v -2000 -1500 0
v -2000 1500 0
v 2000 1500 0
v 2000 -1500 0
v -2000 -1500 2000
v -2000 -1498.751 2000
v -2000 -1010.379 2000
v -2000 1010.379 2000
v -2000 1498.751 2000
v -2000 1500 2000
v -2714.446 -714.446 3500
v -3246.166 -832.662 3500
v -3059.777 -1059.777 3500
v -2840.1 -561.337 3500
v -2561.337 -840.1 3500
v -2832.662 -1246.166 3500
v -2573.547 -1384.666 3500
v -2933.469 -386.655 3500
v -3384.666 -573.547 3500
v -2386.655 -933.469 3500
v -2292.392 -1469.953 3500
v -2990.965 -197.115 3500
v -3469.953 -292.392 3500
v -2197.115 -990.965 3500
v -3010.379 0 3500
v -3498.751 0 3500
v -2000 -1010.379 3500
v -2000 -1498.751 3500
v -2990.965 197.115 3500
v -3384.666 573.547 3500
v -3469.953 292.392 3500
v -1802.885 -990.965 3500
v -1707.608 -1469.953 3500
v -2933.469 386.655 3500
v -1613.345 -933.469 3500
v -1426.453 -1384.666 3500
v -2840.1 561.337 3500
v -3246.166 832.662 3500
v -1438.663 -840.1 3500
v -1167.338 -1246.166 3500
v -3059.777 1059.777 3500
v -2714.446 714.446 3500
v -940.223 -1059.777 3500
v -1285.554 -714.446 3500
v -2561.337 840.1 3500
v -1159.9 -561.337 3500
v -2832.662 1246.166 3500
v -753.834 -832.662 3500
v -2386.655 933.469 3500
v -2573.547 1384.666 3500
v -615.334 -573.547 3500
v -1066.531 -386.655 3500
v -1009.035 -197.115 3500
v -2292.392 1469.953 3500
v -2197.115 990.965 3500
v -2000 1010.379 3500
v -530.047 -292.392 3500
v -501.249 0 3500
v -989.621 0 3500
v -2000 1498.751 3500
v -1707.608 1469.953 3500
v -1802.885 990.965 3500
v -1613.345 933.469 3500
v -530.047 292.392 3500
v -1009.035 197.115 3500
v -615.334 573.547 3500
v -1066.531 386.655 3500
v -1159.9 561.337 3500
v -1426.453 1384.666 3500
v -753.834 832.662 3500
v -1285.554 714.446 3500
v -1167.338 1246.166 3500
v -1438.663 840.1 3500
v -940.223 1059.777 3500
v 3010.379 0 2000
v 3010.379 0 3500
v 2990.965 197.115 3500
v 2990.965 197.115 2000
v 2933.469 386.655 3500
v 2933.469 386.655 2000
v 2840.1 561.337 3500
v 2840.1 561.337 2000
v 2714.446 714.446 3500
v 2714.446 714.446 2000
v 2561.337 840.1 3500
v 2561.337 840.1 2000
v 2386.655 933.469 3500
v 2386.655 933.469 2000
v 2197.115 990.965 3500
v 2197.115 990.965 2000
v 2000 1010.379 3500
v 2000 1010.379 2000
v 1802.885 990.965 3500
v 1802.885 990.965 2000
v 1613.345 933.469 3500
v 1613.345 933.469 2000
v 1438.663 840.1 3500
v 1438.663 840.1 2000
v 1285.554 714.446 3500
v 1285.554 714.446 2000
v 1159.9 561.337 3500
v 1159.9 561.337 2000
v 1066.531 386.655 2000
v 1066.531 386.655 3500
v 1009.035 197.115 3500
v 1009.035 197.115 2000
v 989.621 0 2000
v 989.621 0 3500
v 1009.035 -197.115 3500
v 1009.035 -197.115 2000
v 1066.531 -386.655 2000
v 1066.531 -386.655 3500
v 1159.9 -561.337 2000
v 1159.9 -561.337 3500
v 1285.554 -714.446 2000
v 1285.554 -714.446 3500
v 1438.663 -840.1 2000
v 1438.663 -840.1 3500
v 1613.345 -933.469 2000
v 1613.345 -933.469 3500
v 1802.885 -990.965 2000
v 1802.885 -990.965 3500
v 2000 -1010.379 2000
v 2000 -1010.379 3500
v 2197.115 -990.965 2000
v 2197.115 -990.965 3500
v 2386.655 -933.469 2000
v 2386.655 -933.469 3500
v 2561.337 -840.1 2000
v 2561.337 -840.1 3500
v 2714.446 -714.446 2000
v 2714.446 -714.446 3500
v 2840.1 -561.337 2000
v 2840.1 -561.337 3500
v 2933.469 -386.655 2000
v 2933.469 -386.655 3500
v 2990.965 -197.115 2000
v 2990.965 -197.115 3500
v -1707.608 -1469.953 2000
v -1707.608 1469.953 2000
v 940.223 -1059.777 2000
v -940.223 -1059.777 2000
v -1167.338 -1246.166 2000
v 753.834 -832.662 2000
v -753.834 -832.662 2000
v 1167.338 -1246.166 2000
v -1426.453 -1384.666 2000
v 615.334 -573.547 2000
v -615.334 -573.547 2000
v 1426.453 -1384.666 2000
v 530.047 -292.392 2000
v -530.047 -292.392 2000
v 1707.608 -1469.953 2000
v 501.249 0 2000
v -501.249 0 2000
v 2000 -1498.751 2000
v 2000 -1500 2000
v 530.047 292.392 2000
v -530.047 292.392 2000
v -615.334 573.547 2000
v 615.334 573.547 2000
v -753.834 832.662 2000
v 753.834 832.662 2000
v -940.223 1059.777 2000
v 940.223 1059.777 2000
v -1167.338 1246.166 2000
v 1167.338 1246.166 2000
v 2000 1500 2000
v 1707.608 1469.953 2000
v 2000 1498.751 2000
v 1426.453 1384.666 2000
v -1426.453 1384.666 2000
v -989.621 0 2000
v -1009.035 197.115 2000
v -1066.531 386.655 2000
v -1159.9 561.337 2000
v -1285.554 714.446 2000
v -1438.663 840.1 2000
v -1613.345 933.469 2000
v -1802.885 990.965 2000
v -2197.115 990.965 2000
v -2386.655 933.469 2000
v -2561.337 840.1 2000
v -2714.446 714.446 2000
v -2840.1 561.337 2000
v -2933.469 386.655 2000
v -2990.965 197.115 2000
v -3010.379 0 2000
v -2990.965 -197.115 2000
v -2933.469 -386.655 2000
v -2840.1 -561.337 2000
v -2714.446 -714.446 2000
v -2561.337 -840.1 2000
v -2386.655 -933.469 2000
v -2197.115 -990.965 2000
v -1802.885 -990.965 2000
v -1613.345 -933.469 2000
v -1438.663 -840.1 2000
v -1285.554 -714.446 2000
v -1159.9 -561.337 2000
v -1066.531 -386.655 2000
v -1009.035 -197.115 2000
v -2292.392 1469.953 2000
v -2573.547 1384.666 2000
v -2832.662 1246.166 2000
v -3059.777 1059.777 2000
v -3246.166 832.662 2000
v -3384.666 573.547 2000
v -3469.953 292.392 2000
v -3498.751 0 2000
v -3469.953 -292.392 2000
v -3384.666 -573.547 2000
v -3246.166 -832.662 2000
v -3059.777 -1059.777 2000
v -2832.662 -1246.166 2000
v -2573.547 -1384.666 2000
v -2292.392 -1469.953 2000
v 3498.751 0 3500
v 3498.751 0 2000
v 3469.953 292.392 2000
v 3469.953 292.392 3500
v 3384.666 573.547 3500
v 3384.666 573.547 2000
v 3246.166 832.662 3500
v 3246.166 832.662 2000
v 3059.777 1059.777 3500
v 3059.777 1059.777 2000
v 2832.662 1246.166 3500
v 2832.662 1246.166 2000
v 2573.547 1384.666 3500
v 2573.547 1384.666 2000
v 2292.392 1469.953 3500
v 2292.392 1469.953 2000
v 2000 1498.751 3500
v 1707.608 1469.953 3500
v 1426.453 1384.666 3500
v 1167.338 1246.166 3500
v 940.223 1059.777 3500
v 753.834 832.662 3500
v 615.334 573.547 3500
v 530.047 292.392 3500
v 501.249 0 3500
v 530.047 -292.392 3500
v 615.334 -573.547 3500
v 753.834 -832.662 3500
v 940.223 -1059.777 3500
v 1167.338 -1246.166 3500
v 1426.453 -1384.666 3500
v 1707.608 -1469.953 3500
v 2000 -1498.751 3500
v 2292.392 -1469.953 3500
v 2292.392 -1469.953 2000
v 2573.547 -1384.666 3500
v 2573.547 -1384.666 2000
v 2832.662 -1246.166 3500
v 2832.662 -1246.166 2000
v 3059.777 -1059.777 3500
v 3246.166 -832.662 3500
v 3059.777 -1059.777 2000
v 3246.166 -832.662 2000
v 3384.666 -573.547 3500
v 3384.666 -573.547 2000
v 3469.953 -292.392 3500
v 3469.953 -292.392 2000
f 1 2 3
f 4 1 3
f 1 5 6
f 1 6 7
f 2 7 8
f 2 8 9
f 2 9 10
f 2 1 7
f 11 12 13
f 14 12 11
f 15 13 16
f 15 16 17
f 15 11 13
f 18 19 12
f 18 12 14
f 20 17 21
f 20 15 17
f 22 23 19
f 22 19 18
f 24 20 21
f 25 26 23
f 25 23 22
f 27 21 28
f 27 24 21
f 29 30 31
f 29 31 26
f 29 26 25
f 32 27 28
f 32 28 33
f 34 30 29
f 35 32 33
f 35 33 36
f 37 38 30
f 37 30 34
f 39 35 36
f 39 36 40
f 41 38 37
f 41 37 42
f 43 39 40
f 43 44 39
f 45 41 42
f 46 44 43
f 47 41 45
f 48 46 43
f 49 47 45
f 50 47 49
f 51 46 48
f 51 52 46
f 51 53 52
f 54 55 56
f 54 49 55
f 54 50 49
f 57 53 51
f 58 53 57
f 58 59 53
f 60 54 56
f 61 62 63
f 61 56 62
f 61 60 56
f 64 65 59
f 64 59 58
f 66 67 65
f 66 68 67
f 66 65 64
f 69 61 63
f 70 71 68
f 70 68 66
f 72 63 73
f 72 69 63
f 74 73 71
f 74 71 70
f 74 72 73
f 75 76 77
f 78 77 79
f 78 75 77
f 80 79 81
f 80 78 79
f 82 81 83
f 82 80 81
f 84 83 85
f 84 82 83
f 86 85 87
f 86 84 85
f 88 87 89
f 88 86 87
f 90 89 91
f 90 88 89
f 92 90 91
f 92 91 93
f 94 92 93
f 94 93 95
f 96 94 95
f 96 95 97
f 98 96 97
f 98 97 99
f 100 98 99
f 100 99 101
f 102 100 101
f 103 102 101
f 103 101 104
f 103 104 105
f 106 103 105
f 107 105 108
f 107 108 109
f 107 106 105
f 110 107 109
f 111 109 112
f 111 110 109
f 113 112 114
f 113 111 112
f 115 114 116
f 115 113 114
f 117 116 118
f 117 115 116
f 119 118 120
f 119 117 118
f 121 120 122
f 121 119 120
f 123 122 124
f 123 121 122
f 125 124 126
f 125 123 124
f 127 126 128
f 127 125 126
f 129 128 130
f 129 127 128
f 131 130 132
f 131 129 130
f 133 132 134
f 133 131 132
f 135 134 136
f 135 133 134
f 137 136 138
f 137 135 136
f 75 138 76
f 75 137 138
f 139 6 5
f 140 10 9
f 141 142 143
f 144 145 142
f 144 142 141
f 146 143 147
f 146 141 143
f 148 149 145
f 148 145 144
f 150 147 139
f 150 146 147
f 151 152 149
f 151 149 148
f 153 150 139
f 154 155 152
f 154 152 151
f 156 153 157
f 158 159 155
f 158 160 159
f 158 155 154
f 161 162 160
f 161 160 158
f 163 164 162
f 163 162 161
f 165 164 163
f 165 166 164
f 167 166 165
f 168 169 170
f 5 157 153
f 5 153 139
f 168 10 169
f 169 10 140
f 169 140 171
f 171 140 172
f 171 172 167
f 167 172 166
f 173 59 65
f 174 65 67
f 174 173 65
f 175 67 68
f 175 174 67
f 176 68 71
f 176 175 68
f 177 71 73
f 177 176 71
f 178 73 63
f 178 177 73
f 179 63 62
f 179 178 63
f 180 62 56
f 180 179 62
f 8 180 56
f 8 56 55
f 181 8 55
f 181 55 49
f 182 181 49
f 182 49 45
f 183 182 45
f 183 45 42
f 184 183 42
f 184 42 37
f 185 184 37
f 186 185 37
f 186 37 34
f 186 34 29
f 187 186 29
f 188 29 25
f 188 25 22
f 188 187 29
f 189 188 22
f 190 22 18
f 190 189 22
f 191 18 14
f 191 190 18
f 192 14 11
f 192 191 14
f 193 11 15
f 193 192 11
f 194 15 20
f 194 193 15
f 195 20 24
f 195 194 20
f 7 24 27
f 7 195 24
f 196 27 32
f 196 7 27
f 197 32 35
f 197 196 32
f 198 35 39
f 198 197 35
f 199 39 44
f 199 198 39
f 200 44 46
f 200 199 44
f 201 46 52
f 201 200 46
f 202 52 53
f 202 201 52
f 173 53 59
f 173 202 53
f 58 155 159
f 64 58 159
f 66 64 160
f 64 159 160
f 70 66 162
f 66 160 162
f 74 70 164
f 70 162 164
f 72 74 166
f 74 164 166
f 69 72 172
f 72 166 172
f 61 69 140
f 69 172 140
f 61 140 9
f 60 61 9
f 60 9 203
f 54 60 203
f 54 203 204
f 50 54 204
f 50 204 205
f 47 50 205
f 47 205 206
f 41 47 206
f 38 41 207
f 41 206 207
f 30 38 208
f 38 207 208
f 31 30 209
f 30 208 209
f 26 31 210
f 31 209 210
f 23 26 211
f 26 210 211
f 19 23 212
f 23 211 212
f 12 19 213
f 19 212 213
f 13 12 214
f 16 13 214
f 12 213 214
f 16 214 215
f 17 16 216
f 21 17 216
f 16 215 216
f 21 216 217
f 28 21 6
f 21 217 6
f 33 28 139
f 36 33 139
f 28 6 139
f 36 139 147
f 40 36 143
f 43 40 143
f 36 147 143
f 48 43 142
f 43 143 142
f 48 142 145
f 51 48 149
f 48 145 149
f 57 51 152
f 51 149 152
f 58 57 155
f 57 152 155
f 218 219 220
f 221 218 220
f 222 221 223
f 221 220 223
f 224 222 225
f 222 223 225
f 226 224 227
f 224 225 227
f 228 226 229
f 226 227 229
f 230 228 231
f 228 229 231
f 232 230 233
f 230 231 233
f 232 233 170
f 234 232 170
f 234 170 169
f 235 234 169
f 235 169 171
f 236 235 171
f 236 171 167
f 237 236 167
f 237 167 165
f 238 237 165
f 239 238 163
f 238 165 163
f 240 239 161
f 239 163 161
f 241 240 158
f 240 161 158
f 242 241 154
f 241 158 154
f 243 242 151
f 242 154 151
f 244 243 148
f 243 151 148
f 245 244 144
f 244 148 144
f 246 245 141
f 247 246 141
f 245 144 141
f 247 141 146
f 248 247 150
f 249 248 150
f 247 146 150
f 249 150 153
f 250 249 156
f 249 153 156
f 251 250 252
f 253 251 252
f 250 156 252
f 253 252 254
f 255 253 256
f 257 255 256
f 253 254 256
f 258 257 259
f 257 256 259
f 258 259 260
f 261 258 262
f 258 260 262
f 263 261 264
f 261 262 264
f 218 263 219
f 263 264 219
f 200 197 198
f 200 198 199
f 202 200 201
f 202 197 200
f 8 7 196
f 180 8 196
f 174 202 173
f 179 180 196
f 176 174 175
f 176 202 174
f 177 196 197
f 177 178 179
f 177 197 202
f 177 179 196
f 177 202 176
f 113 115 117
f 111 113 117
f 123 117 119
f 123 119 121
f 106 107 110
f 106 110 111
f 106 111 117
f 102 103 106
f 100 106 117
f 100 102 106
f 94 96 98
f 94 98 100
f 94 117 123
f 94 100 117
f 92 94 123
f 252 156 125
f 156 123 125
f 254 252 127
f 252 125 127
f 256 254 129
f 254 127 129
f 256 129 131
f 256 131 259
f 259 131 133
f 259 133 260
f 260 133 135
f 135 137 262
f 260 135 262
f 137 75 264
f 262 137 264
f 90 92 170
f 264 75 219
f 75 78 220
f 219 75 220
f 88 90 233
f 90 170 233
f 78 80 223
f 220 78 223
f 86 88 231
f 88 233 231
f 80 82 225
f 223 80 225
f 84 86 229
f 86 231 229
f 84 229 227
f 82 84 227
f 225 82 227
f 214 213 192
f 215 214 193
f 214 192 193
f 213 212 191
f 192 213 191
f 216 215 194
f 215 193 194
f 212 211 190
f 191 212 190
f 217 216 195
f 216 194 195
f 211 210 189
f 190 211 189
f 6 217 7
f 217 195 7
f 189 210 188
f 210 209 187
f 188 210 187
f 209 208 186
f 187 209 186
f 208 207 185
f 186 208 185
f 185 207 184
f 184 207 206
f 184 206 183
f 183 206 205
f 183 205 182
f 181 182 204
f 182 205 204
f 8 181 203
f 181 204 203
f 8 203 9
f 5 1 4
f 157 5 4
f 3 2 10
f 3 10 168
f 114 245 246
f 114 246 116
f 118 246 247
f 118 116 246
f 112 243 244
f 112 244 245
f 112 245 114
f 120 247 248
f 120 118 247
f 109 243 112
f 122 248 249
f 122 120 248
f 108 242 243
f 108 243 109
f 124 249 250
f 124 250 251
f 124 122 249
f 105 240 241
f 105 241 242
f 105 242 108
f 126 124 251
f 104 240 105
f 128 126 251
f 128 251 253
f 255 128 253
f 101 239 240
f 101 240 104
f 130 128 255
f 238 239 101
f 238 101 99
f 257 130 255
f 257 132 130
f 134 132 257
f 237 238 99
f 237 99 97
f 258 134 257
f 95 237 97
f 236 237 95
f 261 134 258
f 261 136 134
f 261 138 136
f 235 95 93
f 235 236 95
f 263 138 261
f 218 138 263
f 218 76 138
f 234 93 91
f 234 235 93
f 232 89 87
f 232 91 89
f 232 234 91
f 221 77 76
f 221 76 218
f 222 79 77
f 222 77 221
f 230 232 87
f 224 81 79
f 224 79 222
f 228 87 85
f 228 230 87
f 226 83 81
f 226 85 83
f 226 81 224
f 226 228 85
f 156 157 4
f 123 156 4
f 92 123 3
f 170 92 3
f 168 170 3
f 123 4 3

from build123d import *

# Parameters (mm, degrees)
F0_W     = 4000
F0_H     = 3000
F1_DEPTH = 2000
F2_R     = 1498.751295
F2_R_2   = 1010.379159
F3_DEPTH = 1500


with BuildPart() as f1:
    # F0 (on Top) → F1 (new body)
    with BuildSketch(Plane.XY):
        Rectangle(F0_W, F0_H)
    extrude(amount=F1_DEPTH)

    # F2 (on face) → F3 (join)
    with BuildSketch(Plane.XY.offset(2000)):
        with Locations((-2000, 0)):
            Circle(F2_R)
        with Locations((-2000, 0)):
            Circle(F2_R_2, mode=Mode.SUBTRACT)
        with Locations((2000, 0)):
            Circle(F2_R)
        with Locations((2000, 0)):
            Circle(F2_R_2, mode=Mode.SUBTRACT)
    extrude(amount=F3_DEPTH)


solid = f1.part
